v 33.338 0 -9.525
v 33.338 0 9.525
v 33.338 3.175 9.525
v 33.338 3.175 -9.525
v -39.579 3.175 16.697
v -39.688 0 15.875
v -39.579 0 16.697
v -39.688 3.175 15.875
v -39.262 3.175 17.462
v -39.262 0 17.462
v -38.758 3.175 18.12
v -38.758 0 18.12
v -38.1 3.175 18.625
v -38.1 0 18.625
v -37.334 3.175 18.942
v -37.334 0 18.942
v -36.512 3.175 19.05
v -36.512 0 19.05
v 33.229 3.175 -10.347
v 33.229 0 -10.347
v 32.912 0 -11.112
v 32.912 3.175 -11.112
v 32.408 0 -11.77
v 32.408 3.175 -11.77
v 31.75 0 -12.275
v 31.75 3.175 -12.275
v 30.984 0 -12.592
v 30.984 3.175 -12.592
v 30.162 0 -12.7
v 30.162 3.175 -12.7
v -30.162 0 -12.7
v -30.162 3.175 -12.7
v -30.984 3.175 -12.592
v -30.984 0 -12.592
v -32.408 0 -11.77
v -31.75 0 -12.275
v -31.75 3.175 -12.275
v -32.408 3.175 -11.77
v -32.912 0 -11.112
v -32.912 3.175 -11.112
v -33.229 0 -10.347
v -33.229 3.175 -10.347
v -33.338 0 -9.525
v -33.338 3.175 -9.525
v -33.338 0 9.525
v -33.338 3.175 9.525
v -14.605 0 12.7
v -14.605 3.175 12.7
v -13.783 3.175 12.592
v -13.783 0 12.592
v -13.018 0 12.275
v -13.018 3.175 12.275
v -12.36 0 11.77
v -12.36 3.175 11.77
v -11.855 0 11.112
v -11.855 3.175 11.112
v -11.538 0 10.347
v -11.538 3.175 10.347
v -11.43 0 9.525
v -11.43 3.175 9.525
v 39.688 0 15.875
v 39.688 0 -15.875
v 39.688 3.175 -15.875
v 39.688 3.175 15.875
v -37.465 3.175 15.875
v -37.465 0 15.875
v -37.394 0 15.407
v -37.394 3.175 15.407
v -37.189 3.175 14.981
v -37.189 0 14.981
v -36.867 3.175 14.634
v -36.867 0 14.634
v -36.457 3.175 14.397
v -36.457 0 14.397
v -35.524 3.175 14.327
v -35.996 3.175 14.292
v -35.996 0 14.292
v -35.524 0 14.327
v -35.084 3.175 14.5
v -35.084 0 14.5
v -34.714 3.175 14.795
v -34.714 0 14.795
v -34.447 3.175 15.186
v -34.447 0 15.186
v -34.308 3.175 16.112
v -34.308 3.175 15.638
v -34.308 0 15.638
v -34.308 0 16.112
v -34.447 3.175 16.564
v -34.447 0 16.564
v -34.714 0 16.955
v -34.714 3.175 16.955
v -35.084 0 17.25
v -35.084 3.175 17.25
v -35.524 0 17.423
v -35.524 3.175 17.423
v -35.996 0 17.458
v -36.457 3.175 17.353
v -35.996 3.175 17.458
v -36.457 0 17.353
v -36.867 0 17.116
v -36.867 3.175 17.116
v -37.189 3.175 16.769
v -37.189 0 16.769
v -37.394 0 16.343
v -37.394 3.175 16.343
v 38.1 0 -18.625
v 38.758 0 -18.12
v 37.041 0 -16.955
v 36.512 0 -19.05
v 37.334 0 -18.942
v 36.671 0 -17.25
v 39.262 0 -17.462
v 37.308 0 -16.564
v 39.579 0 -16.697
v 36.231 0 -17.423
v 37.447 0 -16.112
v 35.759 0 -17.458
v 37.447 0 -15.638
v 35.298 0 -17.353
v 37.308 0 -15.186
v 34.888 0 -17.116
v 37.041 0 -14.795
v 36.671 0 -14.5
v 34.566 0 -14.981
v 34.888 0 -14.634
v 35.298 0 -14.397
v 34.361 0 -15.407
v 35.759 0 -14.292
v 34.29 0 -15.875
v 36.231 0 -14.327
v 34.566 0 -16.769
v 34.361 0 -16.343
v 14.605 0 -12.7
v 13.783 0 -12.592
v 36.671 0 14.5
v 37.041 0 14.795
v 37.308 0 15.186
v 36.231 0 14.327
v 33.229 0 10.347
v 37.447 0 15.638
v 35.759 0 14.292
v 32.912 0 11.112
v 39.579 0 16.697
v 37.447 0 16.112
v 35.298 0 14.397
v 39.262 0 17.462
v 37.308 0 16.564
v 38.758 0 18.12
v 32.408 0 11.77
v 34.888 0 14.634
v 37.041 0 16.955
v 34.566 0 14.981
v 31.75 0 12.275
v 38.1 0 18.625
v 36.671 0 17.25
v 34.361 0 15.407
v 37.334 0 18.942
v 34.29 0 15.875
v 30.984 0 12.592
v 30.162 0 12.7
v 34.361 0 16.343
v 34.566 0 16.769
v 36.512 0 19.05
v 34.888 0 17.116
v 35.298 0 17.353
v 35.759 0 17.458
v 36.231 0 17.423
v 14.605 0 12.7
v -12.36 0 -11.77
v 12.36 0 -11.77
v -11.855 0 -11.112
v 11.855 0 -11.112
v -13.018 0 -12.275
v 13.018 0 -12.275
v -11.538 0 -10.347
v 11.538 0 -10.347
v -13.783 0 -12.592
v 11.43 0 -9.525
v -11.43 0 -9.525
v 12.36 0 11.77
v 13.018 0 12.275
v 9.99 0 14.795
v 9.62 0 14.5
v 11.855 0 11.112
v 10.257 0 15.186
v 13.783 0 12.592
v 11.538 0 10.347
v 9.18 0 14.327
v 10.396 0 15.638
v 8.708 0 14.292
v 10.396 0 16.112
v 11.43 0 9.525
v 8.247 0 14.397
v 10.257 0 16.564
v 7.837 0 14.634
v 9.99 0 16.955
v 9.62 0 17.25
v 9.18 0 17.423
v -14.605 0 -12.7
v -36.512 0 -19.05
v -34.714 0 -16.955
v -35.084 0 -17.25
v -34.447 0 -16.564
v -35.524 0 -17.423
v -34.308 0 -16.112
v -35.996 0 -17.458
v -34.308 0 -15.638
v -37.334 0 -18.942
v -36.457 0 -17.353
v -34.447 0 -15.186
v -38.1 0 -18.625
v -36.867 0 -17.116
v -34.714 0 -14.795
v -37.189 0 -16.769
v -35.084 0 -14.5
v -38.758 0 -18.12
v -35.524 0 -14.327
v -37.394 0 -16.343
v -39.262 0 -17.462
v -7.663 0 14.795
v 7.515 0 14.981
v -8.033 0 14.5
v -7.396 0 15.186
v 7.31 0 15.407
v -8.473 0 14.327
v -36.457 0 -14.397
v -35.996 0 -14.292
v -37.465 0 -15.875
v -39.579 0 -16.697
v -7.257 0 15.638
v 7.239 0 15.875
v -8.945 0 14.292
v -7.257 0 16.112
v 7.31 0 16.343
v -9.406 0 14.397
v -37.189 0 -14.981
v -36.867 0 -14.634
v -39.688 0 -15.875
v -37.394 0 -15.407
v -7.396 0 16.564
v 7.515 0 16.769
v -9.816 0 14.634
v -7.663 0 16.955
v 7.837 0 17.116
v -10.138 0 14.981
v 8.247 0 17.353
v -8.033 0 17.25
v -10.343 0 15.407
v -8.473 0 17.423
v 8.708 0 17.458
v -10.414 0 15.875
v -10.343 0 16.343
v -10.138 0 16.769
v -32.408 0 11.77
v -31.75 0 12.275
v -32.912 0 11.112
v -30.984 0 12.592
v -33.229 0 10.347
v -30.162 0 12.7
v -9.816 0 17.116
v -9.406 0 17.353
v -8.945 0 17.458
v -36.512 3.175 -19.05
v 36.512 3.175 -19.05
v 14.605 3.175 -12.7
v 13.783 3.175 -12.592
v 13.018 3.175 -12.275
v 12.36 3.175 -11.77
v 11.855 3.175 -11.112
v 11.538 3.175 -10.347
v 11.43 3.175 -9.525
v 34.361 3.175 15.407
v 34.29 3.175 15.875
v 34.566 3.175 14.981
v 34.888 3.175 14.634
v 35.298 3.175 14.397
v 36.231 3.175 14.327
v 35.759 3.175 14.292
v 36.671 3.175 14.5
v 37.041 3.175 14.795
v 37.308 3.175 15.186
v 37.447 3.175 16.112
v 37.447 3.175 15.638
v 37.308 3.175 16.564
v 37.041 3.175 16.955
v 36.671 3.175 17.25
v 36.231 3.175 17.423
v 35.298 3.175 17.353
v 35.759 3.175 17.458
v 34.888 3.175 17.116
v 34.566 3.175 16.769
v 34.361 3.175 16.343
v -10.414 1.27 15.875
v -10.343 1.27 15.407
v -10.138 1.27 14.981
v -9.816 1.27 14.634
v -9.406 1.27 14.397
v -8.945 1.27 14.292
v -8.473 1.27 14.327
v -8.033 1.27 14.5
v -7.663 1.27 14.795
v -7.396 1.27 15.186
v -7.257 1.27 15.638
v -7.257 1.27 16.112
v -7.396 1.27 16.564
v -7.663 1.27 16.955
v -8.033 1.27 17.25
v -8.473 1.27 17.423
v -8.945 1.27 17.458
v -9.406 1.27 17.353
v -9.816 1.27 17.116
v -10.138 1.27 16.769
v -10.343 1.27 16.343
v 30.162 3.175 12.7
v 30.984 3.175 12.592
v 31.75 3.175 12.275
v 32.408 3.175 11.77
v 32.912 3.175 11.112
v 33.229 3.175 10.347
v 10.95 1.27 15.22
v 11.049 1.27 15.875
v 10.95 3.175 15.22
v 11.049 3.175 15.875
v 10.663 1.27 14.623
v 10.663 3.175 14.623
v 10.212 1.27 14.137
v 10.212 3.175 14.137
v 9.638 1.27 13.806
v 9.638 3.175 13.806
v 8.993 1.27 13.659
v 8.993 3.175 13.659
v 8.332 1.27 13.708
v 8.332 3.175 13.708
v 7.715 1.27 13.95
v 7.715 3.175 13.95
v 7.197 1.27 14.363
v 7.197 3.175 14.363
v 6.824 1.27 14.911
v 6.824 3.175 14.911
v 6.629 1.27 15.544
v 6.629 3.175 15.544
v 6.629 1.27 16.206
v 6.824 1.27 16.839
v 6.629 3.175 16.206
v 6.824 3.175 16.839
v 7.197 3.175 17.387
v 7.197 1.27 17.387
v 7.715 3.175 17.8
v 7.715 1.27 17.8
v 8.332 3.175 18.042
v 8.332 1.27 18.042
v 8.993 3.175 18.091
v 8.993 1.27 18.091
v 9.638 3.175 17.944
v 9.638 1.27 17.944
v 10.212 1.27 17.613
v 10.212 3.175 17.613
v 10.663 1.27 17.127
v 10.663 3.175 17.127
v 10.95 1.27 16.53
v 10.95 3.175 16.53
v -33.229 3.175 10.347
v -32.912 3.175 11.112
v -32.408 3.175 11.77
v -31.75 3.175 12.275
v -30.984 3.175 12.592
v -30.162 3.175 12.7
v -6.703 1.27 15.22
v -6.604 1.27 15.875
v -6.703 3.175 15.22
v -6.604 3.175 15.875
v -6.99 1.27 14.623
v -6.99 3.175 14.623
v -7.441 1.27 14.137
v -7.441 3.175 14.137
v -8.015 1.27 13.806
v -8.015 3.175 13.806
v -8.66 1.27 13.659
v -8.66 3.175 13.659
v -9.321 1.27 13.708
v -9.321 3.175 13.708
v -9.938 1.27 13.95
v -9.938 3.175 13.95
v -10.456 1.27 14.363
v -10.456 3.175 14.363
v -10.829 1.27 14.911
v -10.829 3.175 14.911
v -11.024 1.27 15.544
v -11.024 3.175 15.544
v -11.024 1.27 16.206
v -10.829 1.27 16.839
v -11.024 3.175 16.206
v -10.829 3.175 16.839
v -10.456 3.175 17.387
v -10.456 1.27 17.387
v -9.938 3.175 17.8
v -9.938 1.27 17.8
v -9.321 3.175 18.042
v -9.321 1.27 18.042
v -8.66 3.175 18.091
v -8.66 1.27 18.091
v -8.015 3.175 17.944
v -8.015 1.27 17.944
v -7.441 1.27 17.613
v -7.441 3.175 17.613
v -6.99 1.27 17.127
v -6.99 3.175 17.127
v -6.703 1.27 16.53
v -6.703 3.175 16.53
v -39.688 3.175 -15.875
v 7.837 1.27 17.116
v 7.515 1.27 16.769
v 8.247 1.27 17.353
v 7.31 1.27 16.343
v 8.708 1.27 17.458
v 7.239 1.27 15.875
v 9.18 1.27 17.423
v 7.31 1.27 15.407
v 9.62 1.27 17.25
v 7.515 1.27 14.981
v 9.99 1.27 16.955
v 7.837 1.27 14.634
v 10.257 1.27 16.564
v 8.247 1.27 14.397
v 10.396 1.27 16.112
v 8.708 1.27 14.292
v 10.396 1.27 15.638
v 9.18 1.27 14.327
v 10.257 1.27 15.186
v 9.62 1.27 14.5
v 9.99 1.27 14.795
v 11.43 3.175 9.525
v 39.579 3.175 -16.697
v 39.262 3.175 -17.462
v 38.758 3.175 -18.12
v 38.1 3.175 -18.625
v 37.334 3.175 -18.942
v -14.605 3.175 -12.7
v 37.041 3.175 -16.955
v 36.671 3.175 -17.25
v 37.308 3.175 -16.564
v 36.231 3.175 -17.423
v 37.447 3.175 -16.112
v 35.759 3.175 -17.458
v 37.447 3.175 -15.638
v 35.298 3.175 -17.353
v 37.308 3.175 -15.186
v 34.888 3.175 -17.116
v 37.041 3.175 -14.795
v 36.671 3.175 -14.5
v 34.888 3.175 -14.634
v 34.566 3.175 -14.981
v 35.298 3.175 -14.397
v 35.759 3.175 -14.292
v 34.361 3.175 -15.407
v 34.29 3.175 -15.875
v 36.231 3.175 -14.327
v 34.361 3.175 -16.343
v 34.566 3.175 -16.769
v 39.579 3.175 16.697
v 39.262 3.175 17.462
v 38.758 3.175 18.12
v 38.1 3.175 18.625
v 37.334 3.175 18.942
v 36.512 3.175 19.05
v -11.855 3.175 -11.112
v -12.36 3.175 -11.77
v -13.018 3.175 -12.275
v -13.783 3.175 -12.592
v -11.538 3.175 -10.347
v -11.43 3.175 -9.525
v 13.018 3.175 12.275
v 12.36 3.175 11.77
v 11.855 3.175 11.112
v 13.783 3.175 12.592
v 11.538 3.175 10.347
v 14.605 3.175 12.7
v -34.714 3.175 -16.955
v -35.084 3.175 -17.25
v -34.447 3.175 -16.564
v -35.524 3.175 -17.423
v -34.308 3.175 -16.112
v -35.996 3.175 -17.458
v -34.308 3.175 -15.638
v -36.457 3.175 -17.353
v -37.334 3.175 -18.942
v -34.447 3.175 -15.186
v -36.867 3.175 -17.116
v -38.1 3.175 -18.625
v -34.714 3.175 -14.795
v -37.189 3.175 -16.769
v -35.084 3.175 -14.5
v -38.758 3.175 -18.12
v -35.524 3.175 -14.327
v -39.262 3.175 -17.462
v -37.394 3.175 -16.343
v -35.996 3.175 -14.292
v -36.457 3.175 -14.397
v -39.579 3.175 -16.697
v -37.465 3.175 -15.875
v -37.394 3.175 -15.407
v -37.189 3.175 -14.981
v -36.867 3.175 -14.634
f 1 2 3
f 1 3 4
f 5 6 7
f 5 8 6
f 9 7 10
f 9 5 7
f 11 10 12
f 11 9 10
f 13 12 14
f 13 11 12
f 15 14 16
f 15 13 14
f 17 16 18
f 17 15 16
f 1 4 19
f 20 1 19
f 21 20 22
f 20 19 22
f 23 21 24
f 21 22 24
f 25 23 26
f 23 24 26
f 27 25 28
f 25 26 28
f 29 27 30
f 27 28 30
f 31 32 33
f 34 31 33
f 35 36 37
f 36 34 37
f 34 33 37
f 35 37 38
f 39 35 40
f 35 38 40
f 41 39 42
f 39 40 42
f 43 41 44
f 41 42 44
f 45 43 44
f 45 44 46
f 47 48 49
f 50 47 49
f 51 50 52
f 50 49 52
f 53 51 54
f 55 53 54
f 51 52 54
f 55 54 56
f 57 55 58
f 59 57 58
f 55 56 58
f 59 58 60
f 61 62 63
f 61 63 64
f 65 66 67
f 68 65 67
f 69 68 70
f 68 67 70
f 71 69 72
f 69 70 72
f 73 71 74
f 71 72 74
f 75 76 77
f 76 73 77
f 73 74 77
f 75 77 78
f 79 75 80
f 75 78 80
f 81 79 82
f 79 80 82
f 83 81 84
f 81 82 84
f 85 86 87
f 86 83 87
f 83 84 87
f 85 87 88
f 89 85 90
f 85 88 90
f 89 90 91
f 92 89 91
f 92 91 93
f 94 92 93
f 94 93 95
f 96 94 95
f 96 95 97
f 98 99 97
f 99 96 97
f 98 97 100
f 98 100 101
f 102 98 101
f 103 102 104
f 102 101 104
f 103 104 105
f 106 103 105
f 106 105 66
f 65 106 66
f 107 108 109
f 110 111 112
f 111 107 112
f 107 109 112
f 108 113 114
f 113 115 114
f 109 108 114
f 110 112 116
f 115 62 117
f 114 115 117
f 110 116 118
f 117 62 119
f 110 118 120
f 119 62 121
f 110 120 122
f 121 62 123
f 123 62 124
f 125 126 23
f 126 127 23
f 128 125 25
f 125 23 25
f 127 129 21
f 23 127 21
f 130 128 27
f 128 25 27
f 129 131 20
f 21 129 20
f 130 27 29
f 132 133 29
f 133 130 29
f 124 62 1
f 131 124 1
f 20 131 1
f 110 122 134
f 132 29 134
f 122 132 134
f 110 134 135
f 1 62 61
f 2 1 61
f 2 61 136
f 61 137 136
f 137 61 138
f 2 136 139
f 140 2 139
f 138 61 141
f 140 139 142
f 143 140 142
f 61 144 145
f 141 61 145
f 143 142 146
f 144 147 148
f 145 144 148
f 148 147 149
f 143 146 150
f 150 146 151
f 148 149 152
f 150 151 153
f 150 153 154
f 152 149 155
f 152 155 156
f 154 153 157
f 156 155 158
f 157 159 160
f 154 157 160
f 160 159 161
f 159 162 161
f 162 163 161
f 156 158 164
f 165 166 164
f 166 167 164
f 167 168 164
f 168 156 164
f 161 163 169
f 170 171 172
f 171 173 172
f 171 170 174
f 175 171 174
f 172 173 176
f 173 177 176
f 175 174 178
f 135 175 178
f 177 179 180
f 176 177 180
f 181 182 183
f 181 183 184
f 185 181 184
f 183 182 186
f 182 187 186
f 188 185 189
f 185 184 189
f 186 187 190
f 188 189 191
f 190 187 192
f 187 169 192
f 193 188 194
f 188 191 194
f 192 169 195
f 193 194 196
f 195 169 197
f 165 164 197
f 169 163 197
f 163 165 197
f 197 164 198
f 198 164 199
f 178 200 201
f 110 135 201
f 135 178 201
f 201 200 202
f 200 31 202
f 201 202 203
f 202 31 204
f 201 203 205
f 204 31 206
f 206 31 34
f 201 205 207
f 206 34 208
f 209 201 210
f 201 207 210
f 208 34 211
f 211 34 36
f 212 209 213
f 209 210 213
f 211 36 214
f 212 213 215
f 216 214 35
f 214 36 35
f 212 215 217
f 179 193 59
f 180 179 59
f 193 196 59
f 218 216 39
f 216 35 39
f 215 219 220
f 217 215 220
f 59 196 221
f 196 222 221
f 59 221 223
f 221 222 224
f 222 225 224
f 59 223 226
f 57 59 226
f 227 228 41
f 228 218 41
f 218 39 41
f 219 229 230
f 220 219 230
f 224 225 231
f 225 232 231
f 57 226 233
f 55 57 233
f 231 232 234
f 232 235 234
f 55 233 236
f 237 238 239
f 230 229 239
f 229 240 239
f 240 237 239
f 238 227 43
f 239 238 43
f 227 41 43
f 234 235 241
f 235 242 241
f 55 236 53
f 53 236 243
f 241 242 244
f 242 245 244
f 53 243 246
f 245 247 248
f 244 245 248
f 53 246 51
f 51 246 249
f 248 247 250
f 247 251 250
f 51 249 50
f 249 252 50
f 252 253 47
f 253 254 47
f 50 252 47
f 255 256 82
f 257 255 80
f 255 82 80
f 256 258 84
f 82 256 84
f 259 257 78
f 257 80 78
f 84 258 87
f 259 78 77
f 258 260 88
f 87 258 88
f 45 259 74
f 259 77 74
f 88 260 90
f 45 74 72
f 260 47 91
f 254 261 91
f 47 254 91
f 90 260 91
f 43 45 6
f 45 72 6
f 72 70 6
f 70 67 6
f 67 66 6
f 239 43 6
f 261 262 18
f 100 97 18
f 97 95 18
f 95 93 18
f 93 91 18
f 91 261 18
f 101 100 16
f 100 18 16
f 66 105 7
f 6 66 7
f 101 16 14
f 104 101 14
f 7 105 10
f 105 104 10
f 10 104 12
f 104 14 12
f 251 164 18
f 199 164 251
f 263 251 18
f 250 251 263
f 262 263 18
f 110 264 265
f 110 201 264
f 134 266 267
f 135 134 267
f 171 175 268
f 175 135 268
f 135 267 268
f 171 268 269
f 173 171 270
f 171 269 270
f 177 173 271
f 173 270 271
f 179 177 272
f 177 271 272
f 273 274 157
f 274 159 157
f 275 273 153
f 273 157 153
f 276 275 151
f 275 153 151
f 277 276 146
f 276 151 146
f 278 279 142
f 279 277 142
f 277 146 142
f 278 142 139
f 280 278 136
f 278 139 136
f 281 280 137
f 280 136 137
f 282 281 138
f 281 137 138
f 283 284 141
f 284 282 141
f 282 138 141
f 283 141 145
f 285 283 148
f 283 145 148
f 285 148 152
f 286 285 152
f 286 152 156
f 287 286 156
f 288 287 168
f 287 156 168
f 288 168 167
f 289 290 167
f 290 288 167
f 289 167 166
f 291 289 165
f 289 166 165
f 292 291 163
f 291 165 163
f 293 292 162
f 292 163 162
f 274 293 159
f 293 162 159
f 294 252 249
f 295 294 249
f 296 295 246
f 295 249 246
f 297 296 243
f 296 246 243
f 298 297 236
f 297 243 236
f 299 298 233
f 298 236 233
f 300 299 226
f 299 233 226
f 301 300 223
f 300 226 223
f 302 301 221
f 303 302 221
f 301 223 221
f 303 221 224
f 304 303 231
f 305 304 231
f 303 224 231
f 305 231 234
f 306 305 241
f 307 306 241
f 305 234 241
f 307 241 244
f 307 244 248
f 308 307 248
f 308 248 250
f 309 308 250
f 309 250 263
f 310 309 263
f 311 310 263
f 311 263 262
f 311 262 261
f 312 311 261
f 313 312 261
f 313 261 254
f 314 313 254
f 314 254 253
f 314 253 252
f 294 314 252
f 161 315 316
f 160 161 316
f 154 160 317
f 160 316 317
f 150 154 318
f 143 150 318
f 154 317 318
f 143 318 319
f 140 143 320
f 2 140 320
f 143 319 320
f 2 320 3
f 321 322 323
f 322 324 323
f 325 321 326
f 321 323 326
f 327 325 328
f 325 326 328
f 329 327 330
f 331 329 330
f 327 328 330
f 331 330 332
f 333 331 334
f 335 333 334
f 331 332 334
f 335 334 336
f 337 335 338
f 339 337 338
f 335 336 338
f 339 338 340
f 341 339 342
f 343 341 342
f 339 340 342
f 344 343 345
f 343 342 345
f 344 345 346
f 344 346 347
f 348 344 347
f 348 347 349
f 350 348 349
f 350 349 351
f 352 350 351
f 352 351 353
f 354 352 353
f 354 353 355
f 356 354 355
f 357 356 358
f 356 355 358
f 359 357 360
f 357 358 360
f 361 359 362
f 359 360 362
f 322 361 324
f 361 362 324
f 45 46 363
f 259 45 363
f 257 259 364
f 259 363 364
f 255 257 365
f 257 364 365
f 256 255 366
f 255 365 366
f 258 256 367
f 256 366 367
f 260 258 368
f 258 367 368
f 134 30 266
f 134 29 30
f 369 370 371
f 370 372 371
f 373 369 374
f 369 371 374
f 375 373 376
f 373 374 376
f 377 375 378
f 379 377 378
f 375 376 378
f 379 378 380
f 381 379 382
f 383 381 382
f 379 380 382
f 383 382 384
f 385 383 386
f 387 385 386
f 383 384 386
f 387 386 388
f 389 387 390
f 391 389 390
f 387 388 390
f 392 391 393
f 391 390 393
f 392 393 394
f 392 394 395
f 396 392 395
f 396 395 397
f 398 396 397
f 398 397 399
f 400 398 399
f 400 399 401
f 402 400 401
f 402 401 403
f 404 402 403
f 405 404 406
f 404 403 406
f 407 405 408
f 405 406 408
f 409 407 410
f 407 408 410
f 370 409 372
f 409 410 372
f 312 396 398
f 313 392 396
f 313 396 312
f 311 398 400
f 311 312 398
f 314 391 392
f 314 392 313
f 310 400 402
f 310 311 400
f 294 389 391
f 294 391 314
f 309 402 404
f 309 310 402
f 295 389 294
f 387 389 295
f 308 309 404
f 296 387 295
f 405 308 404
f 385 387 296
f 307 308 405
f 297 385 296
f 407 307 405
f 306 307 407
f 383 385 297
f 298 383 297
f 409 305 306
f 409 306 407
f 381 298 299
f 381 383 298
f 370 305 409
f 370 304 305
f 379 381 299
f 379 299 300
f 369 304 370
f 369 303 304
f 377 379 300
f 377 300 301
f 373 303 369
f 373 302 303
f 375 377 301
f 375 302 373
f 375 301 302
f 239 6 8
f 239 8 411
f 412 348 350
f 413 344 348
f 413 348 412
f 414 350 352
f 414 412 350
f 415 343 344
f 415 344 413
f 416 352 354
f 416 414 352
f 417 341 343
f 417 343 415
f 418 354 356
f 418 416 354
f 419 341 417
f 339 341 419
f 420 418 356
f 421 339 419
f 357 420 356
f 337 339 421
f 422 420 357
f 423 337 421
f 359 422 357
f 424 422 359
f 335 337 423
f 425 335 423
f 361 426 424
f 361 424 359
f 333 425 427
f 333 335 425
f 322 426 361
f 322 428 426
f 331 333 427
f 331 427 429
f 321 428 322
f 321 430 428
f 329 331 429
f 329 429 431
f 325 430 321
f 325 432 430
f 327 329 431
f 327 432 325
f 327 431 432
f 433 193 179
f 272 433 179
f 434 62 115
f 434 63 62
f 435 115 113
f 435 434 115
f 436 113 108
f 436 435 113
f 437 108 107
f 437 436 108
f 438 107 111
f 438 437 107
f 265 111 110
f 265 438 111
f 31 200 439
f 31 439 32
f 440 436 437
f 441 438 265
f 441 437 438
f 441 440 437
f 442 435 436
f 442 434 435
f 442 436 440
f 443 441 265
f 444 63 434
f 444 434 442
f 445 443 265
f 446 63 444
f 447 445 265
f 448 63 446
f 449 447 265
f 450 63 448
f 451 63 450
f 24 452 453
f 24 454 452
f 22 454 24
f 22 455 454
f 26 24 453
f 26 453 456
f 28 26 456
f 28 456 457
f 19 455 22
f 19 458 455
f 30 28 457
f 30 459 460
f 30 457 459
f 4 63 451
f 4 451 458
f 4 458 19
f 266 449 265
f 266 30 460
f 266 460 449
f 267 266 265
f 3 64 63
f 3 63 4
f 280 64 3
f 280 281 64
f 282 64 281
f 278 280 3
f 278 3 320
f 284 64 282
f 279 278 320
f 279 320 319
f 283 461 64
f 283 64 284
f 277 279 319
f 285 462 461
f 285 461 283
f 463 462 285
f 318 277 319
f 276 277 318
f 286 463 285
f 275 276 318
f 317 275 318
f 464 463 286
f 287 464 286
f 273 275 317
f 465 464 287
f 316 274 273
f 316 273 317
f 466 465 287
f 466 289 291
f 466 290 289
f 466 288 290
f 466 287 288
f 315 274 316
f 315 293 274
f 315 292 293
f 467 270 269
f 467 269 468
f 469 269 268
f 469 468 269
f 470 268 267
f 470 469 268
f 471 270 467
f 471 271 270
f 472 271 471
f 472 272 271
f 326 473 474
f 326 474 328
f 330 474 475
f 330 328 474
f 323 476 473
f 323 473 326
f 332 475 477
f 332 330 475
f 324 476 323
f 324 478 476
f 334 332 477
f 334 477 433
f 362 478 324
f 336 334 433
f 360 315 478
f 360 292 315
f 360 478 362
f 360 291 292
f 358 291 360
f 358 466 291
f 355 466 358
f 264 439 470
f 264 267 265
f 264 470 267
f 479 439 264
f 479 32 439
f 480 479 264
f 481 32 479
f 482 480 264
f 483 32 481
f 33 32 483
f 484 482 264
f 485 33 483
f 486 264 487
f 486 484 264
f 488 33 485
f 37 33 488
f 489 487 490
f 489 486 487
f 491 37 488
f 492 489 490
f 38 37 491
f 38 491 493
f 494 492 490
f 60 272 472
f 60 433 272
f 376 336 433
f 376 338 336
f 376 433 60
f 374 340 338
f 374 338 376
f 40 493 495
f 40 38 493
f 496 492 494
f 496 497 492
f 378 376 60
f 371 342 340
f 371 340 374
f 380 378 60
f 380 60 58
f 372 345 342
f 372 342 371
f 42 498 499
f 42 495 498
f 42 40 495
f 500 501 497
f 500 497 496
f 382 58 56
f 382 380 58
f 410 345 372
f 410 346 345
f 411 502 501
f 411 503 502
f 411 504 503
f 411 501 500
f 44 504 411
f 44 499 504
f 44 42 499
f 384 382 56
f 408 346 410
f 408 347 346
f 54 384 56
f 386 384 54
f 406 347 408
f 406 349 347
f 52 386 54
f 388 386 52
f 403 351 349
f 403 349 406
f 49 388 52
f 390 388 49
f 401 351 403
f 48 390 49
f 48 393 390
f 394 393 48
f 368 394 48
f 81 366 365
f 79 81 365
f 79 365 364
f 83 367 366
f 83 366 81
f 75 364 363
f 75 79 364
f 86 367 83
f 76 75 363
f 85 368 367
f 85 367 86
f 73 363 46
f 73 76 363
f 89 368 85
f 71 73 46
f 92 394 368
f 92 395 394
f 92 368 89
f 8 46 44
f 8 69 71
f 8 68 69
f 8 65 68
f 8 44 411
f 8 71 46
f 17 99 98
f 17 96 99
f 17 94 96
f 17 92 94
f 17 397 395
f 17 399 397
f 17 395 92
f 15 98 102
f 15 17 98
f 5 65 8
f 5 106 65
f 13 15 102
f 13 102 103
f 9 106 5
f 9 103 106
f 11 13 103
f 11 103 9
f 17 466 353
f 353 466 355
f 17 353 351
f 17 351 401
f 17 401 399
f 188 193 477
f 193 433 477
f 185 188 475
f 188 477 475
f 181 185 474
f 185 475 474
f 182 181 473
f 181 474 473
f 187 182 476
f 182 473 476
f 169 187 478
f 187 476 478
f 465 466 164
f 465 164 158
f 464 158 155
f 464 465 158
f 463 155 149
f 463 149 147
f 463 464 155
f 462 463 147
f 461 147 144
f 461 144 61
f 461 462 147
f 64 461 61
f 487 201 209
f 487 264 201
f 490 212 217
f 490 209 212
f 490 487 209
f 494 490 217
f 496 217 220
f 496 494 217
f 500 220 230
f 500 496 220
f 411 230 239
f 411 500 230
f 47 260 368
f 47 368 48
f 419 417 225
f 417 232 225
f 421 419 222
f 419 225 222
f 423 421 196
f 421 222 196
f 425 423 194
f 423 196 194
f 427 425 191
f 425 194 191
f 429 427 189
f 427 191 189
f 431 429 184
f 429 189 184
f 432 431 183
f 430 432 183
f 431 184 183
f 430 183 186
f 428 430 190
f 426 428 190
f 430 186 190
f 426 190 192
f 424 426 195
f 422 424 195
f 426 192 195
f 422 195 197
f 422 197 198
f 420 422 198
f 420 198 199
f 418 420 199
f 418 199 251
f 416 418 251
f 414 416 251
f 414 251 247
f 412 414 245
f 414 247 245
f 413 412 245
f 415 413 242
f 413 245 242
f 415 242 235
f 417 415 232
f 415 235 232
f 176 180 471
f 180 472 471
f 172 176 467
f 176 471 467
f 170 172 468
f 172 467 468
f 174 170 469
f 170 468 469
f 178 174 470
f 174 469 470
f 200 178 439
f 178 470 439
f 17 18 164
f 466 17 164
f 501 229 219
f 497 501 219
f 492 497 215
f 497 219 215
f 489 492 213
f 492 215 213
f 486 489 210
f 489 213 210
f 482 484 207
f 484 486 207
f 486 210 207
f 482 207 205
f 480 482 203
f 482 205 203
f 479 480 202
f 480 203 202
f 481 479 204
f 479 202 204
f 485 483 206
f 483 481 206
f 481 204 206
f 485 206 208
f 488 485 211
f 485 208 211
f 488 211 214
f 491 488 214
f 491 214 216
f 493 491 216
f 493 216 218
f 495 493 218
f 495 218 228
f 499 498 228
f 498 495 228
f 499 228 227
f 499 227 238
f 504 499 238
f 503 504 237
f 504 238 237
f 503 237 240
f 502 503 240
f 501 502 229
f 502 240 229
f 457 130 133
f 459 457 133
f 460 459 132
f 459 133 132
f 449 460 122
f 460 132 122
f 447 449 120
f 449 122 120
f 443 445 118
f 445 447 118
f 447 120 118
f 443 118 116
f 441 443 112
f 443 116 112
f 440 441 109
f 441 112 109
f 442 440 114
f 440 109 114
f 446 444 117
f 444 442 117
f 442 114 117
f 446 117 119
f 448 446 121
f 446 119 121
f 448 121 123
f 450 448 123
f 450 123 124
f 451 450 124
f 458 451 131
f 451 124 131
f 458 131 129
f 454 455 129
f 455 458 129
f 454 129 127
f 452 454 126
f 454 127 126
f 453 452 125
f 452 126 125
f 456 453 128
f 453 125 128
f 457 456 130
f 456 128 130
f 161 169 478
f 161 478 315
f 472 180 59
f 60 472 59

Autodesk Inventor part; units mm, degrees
ref_plane "YZ Plane" through (0, 0, 0) normal (1, 0, 0) x (0, 1, 0)
ref_plane "XZ Plane" through (0, 0, 0) normal (0, 1, 0) x (-1, 0, 0)
ref_plane "XY Plane" through (0, 0, 0) normal (0, 0, 1) x (1, 0, 0)
sketch "Sketch1" plane through (0, 0, 0) normal (0, 1, 0) x (-1, 0, 0)
  line L0 (33.3375, 19.05) -> (-33.3375, 19.05)
  line L1 (-33.3375, 19.05) -> (-33.3375, -19.05)
  line L2 (-33.3375, -19.05) -> (33.3375, -19.05)
  line L3 (33.3375, -19.05) -> (33.3375, 19.05)
  line L4 (33.3375, 19.05) -> (-33.3375, -19.05) construction
  line L5 (-33.3375, 19.05) -> (33.3375, -19.05) construction
  line L6 (39.6875, -19.05) -> (-39.6875, -19.05)
  line L7 (-39.6875, -19.05) -> (-39.6875, 19.05)
  line L8 (-39.6875, 19.05) -> (39.6875, 19.05)
  line L9 (39.6875, 19.05) -> (39.6875, -19.05)
  line L10 (39.6875, -19.05) -> (-39.6875, 19.05) construction
  line L11 (-39.6875, -19.05) -> (39.6875, 19.05) construction
  circle A0 centre (35.8775, -15.875) radius 1.5875
  circle A1 centre (35.8775, 15.875) radius 1.5875
  circle A2 centre (-35.8775, -15.875) radius 1.5875
  circle A3 centre (-35.8775, 15.875) radius 1.5875
  line L12 (33.3375, 12.7) -> (-33.3375, 12.7)
  line L13 (-33.3375, 12.7) -> (-33.3375, -12.7)
  line L14 (-33.3375, -12.7) -> (33.3375, -12.7)
  line L15 (33.3375, -12.7) -> (33.3375, 12.7)
  line L16 (11.43, 12.7) -> (-11.43, 12.7)
  line L17 (-11.43, 12.7) -> (-11.43, -12.7)
  line L18 (-11.43, -12.7) -> (11.43, -12.7)
  line L19 (11.43, -12.7) -> (11.43, 12.7)
  circle A4 centre (8.8265, 15.875) radius 1.5875
  circle A5 centre (-8.8265, 15.875) radius 1.5875
  point P0 (0, 0)
  point P1 (0, 12.7)
  point P2 (0, 0)
  point P3 (0, 0)
  point P4 (0, -12.7)
  point P5 (0, 0)
  point P6 (-11.43, -12.7)
  point P7 (-11.43, 12.7)
  point P8 (11.43, -12.7)
  point P9 (11.43, 12.7)
  dimension "d0" = 66.675
  dimension "d1" = 38.1
  dimension "d2" = 6.35
  dimension "d5" = 31.75
  dimension "d8" = 71.755
  dimension "d11" = 2.54
  dimension "d12" = 3.175
  dimension "d14" = 3.175
  dimension "d15" = 66.675
  dimension "d19" = 22.86
  dimension "d23" = 3.175
  dimension "d24" = 3.175
  dimension "d25" = 17.653
  dimension "d26" = 8.8265
  dimension "d28" = 6.35
  dimension "d29" = 6.35
extrude "Extrusion1" add sketch "Sketch1" along normal blind 3.175 contours L3 L12 L1 L0 | L8 L9 L6 L3 | L1 L6 L7 L8 | L3 L2 L1 L14 | L19 L14 L17 L12
fillet "Fillet1" radius 3.175 12 edges at (-39.6875, 1.5875, 19.05) (39.6875, 1.5875, 19.05) (-39.6875, 1.5875, -19.05) (39.6875, 1.5875, -19.05) (-33.3375, 1.5875, 12.7) (11.43, 1.5875, 12.7) (33.3375, 1.5875, 12.7) (11.43, 1.5875, -12.7) (33.3375, 1.5875, -12.7) (-11.43, 1.5875, -12.7) (-33.3375, 1.5875, -12.7) (-11.43, 1.5875, 12.7)
sketch "Sketch3" plane through (0, 3.175, 0) normal (0, 1, 0) x (1, 0, 0)
  circle A0 centre (-8.8265, -15.875) radius 1.5875 projected
  circle A1 centre (-8.8265, -15.875) radius 2.2225
  circle A2 centre (8.8265, -15.875) radius 1.5875 projected
  circle A3 centre (8.8265, -15.875) radius 2.2225
  point P0 (0, 0)
  dimension "d30" = 4.445
  dimension "d31" = 4.445
extrude "Extrusion2" cut sketch "Sketch3" against normal blind 1.905 contours A0 | A1 | A2 | A3
equation "\"d15\" = d0"
equation "\"d23\" = d14"
equation "\"d24\" = d14"
equation "\"d26\" = 0.5 * d25"
equation "\"d28\" = d2"
equation "\"d29\" = d2"
properties part number "Battery_Plate"
